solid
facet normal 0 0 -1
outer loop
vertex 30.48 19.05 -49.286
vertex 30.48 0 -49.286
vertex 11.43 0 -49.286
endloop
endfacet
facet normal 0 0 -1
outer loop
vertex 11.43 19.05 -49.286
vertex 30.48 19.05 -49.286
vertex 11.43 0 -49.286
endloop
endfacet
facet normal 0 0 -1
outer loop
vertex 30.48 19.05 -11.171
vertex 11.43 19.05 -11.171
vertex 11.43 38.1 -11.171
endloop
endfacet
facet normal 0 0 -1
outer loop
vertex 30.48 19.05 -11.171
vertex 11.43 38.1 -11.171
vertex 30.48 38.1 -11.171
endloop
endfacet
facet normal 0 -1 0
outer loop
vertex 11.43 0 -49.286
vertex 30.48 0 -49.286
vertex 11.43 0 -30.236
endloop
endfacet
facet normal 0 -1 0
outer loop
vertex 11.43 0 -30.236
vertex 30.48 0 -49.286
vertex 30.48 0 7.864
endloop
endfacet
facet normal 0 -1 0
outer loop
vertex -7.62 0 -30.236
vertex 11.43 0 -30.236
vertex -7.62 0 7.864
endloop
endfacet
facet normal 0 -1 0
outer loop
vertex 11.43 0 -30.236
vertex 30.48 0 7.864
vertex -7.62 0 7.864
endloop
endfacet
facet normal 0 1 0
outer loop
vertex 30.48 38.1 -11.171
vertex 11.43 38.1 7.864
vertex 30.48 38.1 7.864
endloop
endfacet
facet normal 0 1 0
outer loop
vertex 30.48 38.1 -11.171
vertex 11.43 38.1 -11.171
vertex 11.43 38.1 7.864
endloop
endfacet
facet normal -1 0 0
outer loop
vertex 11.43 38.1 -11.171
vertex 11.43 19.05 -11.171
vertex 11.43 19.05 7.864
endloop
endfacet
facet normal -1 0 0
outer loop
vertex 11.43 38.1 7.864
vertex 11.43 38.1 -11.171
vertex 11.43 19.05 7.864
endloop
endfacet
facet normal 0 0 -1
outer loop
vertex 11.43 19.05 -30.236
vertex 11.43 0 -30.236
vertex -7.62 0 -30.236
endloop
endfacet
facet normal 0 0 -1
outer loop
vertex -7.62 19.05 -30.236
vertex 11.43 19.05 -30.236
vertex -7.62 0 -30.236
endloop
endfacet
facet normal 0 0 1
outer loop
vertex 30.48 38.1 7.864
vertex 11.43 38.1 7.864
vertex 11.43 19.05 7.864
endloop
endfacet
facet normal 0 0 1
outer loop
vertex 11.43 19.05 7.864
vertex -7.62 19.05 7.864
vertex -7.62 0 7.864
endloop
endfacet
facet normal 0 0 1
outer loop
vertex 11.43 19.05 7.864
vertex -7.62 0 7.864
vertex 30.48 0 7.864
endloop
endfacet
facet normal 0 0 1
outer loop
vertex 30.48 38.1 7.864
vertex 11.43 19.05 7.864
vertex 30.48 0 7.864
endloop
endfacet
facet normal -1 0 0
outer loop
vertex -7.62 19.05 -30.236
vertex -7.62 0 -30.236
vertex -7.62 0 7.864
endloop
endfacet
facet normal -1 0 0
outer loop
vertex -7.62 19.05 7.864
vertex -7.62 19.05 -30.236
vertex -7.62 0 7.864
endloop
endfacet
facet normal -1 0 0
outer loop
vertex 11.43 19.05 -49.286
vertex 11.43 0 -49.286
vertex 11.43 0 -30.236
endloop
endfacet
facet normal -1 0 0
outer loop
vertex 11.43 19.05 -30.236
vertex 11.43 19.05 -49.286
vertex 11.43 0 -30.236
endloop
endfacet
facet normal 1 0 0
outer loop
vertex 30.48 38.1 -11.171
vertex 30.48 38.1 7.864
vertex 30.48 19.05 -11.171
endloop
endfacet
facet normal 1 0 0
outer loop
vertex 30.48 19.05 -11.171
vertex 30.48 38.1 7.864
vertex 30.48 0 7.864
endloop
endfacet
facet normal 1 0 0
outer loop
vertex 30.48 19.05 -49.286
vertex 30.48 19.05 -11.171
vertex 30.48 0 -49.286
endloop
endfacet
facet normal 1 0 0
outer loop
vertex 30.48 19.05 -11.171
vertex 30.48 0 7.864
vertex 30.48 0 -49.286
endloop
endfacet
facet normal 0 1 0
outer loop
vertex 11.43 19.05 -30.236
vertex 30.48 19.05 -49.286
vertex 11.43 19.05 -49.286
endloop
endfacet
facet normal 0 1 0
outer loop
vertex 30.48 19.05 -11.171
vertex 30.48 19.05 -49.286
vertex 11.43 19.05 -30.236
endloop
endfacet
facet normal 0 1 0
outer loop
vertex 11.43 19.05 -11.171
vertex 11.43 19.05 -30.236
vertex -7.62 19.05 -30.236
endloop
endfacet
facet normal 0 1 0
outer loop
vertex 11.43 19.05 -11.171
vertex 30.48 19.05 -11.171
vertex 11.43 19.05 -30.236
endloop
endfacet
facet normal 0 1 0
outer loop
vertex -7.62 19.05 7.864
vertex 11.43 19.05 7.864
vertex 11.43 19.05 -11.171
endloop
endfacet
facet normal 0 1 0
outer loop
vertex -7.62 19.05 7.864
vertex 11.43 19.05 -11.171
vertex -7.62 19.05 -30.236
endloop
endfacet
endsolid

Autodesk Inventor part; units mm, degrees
ref_plane "YZ Plane" through (0, 0, 0) normal (1, 0, 0) x (0, 1, 0)
ref_plane "XZ Plane" through (0, 0, 0) normal (0, 1, 0) x (-1, 0, 0)
ref_plane "XY Plane" through (0, 0, 0) normal (0, 0, 1) x (1, 0, 0)
sketch "Sketch1" plane through (0, 0, 0) normal (0, 1, 0) x (-1, 0, 0)
  line L0 (7.6204, 7.8637) -> (-30.4796, 7.8637)
  line L1 (-30.4796, 7.8637) -> (-30.4796, -49.2863)
  line L2 (-30.4796, -49.2863) -> (-11.4296, -49.2863)
  line L3 (-11.4296, -49.2863) -> (-11.4296, -30.2363)
  line L4 (-11.4296, -30.2363) -> (7.6204, -30.2363)
  line L5 (7.6204, -30.2363) -> (7.6204, 7.8637)
  point P0 (0, 0)
  dimension "d0" = 38.1
  dimension "d1" = 57.15
  dimension "d2" = 19.05
  dimension "d3" = 19.05
  dimension "d4" = 19.05
extrude "Extrusion1" add sketch "Sketch1" along normal blind 19.05
sketch "Sketch2" plane through (0, 19.05, 0) normal (0, 1, 0) x (1, 0, 0)
  line L0 (11.4296, 11.1711) -> (11.4296, -7.8637)
  line L1 (-7.6204, -7.8637) -> (30.4796, -7.8637) projected
  line L2 (11.4296, 11.1711) -> (30.4796, 11.1711)
  line L3 (30.4796, -7.8637) -> (30.4796, 49.2863) projected
  line L4 (30.4796, 11.1711) -> (30.4796, -7.8637)
  line L5 (30.4796, -7.8637) -> (11.4296, -7.8637)
  point P0 (0, 0)
extrude "Extrusion2" add sketch "Sketch2" along normal blind 19.05
properties part number "Additive Method(1)"
